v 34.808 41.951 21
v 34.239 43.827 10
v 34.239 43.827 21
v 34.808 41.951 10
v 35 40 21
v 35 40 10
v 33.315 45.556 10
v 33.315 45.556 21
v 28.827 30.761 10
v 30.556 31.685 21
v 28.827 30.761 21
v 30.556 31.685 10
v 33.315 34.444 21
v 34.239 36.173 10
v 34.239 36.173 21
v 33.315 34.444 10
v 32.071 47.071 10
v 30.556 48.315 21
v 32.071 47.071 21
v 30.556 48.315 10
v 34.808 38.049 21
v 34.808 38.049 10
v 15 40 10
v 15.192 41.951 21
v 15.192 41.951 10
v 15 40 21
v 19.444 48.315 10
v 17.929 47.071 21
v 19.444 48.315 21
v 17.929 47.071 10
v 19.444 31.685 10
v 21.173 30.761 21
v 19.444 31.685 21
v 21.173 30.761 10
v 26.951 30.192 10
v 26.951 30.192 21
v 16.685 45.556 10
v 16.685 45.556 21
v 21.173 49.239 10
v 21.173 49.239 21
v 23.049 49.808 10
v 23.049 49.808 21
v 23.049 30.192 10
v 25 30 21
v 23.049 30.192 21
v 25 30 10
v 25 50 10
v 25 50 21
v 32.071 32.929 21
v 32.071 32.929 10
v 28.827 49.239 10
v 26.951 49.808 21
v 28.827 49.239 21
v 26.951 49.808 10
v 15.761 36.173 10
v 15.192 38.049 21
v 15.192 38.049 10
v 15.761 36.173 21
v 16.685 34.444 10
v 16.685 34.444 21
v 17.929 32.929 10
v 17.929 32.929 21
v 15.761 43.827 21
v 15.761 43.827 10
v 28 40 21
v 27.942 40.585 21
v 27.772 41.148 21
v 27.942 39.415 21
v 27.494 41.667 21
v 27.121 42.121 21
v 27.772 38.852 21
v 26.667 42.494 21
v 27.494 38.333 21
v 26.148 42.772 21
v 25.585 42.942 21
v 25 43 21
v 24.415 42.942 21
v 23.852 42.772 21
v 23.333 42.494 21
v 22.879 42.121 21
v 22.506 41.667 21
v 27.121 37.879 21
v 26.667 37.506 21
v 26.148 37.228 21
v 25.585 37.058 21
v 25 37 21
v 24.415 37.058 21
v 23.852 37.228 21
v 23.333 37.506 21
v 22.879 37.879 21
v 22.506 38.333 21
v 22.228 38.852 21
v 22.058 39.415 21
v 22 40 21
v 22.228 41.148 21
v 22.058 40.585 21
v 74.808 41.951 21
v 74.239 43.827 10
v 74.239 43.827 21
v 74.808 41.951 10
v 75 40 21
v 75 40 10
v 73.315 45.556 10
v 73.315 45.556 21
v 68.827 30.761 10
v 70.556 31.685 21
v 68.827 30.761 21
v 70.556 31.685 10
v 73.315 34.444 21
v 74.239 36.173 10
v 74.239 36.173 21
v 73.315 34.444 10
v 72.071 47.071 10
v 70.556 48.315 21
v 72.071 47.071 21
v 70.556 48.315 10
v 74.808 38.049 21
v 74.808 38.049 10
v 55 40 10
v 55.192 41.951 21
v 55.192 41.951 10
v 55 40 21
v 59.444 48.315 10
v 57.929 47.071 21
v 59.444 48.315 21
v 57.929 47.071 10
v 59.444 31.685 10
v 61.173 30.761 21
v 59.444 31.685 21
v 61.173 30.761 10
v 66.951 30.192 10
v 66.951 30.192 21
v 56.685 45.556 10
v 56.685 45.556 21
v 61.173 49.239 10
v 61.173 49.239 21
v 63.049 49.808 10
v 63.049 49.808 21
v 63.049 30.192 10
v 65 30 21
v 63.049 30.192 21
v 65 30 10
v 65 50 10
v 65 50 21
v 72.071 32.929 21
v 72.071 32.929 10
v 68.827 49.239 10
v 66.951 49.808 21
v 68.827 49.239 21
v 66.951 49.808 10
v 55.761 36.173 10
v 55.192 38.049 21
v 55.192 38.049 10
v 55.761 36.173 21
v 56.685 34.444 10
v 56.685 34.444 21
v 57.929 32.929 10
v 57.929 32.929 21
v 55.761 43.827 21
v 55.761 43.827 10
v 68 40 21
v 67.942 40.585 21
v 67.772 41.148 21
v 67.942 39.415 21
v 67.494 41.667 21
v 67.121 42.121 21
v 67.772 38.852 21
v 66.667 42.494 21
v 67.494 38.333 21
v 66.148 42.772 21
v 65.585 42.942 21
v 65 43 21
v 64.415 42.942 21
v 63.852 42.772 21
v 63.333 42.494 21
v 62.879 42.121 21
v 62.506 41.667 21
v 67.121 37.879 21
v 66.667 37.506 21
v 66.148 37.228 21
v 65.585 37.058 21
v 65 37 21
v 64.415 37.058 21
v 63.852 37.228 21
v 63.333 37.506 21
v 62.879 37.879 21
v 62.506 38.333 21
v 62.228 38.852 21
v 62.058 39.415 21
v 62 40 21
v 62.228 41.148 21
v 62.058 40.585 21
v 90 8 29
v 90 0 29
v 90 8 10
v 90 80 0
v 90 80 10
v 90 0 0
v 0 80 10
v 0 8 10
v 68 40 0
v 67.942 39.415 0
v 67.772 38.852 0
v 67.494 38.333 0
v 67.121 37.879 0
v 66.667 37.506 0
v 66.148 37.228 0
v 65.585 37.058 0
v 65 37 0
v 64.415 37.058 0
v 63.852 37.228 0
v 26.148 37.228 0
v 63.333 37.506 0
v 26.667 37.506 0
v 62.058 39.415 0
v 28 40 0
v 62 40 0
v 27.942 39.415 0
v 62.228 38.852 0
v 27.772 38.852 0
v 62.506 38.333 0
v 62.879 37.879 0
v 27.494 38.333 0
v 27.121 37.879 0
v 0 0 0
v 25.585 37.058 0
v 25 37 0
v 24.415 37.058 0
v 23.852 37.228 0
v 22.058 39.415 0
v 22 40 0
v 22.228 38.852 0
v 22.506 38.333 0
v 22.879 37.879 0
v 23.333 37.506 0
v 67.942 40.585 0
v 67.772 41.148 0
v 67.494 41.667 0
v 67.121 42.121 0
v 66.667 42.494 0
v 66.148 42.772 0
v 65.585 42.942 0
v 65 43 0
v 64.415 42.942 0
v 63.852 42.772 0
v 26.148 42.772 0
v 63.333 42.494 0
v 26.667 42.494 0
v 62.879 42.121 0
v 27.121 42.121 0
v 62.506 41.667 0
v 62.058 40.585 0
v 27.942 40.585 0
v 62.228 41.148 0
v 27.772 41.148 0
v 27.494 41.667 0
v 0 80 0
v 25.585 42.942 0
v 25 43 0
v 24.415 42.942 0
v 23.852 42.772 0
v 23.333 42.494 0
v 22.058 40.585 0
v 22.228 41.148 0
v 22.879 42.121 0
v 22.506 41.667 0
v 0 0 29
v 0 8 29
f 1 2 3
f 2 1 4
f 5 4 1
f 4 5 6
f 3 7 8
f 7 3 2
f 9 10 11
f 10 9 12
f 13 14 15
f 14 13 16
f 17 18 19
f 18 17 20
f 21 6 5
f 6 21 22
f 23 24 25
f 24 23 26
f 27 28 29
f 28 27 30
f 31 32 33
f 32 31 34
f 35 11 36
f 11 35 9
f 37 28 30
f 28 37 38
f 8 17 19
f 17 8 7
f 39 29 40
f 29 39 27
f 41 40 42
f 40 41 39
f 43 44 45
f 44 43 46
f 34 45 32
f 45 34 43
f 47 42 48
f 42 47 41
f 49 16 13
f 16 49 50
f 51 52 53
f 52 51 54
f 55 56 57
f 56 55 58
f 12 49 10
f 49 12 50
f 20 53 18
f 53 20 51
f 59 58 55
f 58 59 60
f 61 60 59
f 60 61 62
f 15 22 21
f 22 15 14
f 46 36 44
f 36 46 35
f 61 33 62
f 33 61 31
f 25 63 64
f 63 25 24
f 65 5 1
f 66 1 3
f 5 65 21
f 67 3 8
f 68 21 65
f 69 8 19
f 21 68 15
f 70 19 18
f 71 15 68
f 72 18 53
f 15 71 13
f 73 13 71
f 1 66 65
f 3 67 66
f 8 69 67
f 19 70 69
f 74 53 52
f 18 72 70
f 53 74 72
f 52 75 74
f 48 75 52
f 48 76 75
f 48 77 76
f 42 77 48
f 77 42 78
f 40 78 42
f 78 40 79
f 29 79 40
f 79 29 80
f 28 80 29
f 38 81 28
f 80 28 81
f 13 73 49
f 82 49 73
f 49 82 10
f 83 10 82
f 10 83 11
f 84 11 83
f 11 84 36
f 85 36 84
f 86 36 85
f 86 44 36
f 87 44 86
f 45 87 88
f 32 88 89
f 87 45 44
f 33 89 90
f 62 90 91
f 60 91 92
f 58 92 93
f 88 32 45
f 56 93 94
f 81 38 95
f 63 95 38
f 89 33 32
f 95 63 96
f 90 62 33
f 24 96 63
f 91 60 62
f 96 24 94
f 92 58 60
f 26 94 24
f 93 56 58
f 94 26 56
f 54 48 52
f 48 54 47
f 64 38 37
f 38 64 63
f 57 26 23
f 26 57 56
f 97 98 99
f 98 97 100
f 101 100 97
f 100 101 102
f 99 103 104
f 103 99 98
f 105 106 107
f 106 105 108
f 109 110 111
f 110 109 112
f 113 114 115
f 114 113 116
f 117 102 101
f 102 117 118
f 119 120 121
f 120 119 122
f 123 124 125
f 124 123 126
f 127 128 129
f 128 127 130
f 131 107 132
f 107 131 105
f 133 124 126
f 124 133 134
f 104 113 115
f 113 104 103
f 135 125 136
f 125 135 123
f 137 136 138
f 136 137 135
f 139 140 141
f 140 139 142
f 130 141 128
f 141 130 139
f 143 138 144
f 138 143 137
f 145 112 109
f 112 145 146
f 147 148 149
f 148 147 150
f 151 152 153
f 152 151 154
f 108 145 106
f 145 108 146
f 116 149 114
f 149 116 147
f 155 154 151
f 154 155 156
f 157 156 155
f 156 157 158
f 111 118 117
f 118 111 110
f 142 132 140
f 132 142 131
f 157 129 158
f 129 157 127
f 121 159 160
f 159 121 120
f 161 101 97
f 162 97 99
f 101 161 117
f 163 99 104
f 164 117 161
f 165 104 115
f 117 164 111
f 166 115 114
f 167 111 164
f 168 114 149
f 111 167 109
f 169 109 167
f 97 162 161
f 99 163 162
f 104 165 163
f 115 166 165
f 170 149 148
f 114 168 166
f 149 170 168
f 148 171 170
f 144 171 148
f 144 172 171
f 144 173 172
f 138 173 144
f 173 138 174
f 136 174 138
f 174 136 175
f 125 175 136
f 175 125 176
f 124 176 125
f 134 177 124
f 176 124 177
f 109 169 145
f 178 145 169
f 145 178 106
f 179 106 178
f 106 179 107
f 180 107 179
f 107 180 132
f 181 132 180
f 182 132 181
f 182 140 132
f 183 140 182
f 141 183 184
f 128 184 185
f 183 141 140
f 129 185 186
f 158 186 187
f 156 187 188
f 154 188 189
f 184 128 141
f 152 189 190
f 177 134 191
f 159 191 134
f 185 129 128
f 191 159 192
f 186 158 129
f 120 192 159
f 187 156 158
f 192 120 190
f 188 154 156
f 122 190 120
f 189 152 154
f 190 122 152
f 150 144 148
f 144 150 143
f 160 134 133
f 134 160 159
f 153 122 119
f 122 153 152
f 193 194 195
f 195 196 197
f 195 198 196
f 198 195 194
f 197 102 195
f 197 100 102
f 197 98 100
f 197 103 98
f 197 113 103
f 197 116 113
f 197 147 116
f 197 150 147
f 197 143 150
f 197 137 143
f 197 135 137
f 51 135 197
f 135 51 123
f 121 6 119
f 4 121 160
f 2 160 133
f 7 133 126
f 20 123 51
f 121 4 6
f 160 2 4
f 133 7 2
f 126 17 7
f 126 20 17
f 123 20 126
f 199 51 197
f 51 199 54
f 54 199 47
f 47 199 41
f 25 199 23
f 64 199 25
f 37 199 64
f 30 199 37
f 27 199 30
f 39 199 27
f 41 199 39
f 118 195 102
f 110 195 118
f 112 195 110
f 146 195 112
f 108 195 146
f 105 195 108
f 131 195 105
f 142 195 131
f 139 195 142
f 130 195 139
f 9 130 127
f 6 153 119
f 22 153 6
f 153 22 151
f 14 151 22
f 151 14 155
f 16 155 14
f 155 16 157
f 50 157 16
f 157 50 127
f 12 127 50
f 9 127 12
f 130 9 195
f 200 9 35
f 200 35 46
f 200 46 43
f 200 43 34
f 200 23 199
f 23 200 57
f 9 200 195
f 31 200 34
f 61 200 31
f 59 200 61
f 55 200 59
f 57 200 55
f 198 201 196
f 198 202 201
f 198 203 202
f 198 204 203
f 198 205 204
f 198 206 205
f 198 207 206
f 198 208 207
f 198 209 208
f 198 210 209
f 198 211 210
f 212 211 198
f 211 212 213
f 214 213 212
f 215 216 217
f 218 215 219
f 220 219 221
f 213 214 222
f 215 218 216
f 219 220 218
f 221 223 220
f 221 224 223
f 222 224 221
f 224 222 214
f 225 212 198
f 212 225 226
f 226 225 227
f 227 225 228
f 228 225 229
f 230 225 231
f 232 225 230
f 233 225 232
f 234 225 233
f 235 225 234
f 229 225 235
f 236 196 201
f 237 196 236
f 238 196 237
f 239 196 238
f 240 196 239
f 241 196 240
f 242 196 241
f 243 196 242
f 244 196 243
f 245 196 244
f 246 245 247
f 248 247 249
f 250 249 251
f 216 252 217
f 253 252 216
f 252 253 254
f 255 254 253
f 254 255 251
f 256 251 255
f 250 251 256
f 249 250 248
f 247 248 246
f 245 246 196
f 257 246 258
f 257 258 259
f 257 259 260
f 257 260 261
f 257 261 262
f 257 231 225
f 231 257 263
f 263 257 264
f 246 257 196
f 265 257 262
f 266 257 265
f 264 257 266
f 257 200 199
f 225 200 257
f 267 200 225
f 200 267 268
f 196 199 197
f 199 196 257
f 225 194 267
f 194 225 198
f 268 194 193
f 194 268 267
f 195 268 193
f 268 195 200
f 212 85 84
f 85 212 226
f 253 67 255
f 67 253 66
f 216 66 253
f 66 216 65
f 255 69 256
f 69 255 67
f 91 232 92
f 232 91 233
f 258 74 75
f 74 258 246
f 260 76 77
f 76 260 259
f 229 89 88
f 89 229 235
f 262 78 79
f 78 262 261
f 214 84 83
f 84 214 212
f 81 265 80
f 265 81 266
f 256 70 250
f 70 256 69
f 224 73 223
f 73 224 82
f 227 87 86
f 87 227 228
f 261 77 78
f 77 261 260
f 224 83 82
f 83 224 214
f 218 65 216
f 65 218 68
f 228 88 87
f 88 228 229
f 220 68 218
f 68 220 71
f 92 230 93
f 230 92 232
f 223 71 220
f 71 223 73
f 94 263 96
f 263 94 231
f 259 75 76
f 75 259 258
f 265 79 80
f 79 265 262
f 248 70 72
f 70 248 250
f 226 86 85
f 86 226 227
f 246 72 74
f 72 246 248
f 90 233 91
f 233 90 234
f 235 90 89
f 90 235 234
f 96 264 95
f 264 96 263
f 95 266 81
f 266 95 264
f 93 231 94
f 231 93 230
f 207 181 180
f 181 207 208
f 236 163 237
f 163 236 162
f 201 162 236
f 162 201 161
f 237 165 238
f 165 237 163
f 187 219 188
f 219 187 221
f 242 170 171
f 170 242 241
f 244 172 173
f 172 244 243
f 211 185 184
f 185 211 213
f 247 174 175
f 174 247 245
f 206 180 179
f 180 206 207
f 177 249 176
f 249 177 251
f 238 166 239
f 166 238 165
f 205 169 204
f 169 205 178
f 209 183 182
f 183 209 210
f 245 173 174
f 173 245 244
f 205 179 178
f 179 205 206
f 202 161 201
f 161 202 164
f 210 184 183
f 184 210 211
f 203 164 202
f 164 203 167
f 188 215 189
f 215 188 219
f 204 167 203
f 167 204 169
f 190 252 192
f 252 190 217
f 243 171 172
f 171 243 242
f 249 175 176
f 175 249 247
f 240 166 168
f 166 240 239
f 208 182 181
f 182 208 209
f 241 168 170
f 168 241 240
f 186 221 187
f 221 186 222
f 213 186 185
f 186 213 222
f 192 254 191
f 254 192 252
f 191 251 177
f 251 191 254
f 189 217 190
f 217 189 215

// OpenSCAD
$fn = 32;

// ----------------------------------------------------------------------
// Drill jig: fence jig
// ----------------------------------------------------------------------

// --- parameters (mm) ---
plate_l = 90;             // plate length, X
plate_w = 80;             // plate width, Y
plate_t = 10;             // plate thickness
boss_d = 20;              // guide boss diameter
boss_h = 12;              // boss height above the plate
guide_d = 6;              // guide hole diameter
boss_pitch = 40;          // boss pitch
fence_h = 20;             // fence height above the plate
fence_t = 8;              // fence thickness

n_boss = 2;  // guide bosses
boss_x0 = (plate_l - (n_boss - 1) * boss_pitch) / 2;  // first boss X
boss_top = plate_t - 1 + boss_h;  // boss crown height
fence_top = plate_t - 1 + fence_h;  // fence crown height
total_h = max([fence_top, boss_top]);  // overall height

difference() {
  union() {
  cube([plate_l, plate_w, plate_t]);
  for (i = [0 : n_boss - 1])
    translate([boss_x0 + i * boss_pitch, plate_w / 2, plate_t - 1])
      cylinder(h = boss_h, d = boss_d);
  translate([0, 0, plate_t - 1]) cube([plate_l, fence_t, fence_h]);
  }
  for (i = [0 : n_boss - 1])
    translate([boss_x0 + i * boss_pitch, plate_w / 2, -1])
      cylinder(h = plate_t + boss_h, d = guide_d);
}
